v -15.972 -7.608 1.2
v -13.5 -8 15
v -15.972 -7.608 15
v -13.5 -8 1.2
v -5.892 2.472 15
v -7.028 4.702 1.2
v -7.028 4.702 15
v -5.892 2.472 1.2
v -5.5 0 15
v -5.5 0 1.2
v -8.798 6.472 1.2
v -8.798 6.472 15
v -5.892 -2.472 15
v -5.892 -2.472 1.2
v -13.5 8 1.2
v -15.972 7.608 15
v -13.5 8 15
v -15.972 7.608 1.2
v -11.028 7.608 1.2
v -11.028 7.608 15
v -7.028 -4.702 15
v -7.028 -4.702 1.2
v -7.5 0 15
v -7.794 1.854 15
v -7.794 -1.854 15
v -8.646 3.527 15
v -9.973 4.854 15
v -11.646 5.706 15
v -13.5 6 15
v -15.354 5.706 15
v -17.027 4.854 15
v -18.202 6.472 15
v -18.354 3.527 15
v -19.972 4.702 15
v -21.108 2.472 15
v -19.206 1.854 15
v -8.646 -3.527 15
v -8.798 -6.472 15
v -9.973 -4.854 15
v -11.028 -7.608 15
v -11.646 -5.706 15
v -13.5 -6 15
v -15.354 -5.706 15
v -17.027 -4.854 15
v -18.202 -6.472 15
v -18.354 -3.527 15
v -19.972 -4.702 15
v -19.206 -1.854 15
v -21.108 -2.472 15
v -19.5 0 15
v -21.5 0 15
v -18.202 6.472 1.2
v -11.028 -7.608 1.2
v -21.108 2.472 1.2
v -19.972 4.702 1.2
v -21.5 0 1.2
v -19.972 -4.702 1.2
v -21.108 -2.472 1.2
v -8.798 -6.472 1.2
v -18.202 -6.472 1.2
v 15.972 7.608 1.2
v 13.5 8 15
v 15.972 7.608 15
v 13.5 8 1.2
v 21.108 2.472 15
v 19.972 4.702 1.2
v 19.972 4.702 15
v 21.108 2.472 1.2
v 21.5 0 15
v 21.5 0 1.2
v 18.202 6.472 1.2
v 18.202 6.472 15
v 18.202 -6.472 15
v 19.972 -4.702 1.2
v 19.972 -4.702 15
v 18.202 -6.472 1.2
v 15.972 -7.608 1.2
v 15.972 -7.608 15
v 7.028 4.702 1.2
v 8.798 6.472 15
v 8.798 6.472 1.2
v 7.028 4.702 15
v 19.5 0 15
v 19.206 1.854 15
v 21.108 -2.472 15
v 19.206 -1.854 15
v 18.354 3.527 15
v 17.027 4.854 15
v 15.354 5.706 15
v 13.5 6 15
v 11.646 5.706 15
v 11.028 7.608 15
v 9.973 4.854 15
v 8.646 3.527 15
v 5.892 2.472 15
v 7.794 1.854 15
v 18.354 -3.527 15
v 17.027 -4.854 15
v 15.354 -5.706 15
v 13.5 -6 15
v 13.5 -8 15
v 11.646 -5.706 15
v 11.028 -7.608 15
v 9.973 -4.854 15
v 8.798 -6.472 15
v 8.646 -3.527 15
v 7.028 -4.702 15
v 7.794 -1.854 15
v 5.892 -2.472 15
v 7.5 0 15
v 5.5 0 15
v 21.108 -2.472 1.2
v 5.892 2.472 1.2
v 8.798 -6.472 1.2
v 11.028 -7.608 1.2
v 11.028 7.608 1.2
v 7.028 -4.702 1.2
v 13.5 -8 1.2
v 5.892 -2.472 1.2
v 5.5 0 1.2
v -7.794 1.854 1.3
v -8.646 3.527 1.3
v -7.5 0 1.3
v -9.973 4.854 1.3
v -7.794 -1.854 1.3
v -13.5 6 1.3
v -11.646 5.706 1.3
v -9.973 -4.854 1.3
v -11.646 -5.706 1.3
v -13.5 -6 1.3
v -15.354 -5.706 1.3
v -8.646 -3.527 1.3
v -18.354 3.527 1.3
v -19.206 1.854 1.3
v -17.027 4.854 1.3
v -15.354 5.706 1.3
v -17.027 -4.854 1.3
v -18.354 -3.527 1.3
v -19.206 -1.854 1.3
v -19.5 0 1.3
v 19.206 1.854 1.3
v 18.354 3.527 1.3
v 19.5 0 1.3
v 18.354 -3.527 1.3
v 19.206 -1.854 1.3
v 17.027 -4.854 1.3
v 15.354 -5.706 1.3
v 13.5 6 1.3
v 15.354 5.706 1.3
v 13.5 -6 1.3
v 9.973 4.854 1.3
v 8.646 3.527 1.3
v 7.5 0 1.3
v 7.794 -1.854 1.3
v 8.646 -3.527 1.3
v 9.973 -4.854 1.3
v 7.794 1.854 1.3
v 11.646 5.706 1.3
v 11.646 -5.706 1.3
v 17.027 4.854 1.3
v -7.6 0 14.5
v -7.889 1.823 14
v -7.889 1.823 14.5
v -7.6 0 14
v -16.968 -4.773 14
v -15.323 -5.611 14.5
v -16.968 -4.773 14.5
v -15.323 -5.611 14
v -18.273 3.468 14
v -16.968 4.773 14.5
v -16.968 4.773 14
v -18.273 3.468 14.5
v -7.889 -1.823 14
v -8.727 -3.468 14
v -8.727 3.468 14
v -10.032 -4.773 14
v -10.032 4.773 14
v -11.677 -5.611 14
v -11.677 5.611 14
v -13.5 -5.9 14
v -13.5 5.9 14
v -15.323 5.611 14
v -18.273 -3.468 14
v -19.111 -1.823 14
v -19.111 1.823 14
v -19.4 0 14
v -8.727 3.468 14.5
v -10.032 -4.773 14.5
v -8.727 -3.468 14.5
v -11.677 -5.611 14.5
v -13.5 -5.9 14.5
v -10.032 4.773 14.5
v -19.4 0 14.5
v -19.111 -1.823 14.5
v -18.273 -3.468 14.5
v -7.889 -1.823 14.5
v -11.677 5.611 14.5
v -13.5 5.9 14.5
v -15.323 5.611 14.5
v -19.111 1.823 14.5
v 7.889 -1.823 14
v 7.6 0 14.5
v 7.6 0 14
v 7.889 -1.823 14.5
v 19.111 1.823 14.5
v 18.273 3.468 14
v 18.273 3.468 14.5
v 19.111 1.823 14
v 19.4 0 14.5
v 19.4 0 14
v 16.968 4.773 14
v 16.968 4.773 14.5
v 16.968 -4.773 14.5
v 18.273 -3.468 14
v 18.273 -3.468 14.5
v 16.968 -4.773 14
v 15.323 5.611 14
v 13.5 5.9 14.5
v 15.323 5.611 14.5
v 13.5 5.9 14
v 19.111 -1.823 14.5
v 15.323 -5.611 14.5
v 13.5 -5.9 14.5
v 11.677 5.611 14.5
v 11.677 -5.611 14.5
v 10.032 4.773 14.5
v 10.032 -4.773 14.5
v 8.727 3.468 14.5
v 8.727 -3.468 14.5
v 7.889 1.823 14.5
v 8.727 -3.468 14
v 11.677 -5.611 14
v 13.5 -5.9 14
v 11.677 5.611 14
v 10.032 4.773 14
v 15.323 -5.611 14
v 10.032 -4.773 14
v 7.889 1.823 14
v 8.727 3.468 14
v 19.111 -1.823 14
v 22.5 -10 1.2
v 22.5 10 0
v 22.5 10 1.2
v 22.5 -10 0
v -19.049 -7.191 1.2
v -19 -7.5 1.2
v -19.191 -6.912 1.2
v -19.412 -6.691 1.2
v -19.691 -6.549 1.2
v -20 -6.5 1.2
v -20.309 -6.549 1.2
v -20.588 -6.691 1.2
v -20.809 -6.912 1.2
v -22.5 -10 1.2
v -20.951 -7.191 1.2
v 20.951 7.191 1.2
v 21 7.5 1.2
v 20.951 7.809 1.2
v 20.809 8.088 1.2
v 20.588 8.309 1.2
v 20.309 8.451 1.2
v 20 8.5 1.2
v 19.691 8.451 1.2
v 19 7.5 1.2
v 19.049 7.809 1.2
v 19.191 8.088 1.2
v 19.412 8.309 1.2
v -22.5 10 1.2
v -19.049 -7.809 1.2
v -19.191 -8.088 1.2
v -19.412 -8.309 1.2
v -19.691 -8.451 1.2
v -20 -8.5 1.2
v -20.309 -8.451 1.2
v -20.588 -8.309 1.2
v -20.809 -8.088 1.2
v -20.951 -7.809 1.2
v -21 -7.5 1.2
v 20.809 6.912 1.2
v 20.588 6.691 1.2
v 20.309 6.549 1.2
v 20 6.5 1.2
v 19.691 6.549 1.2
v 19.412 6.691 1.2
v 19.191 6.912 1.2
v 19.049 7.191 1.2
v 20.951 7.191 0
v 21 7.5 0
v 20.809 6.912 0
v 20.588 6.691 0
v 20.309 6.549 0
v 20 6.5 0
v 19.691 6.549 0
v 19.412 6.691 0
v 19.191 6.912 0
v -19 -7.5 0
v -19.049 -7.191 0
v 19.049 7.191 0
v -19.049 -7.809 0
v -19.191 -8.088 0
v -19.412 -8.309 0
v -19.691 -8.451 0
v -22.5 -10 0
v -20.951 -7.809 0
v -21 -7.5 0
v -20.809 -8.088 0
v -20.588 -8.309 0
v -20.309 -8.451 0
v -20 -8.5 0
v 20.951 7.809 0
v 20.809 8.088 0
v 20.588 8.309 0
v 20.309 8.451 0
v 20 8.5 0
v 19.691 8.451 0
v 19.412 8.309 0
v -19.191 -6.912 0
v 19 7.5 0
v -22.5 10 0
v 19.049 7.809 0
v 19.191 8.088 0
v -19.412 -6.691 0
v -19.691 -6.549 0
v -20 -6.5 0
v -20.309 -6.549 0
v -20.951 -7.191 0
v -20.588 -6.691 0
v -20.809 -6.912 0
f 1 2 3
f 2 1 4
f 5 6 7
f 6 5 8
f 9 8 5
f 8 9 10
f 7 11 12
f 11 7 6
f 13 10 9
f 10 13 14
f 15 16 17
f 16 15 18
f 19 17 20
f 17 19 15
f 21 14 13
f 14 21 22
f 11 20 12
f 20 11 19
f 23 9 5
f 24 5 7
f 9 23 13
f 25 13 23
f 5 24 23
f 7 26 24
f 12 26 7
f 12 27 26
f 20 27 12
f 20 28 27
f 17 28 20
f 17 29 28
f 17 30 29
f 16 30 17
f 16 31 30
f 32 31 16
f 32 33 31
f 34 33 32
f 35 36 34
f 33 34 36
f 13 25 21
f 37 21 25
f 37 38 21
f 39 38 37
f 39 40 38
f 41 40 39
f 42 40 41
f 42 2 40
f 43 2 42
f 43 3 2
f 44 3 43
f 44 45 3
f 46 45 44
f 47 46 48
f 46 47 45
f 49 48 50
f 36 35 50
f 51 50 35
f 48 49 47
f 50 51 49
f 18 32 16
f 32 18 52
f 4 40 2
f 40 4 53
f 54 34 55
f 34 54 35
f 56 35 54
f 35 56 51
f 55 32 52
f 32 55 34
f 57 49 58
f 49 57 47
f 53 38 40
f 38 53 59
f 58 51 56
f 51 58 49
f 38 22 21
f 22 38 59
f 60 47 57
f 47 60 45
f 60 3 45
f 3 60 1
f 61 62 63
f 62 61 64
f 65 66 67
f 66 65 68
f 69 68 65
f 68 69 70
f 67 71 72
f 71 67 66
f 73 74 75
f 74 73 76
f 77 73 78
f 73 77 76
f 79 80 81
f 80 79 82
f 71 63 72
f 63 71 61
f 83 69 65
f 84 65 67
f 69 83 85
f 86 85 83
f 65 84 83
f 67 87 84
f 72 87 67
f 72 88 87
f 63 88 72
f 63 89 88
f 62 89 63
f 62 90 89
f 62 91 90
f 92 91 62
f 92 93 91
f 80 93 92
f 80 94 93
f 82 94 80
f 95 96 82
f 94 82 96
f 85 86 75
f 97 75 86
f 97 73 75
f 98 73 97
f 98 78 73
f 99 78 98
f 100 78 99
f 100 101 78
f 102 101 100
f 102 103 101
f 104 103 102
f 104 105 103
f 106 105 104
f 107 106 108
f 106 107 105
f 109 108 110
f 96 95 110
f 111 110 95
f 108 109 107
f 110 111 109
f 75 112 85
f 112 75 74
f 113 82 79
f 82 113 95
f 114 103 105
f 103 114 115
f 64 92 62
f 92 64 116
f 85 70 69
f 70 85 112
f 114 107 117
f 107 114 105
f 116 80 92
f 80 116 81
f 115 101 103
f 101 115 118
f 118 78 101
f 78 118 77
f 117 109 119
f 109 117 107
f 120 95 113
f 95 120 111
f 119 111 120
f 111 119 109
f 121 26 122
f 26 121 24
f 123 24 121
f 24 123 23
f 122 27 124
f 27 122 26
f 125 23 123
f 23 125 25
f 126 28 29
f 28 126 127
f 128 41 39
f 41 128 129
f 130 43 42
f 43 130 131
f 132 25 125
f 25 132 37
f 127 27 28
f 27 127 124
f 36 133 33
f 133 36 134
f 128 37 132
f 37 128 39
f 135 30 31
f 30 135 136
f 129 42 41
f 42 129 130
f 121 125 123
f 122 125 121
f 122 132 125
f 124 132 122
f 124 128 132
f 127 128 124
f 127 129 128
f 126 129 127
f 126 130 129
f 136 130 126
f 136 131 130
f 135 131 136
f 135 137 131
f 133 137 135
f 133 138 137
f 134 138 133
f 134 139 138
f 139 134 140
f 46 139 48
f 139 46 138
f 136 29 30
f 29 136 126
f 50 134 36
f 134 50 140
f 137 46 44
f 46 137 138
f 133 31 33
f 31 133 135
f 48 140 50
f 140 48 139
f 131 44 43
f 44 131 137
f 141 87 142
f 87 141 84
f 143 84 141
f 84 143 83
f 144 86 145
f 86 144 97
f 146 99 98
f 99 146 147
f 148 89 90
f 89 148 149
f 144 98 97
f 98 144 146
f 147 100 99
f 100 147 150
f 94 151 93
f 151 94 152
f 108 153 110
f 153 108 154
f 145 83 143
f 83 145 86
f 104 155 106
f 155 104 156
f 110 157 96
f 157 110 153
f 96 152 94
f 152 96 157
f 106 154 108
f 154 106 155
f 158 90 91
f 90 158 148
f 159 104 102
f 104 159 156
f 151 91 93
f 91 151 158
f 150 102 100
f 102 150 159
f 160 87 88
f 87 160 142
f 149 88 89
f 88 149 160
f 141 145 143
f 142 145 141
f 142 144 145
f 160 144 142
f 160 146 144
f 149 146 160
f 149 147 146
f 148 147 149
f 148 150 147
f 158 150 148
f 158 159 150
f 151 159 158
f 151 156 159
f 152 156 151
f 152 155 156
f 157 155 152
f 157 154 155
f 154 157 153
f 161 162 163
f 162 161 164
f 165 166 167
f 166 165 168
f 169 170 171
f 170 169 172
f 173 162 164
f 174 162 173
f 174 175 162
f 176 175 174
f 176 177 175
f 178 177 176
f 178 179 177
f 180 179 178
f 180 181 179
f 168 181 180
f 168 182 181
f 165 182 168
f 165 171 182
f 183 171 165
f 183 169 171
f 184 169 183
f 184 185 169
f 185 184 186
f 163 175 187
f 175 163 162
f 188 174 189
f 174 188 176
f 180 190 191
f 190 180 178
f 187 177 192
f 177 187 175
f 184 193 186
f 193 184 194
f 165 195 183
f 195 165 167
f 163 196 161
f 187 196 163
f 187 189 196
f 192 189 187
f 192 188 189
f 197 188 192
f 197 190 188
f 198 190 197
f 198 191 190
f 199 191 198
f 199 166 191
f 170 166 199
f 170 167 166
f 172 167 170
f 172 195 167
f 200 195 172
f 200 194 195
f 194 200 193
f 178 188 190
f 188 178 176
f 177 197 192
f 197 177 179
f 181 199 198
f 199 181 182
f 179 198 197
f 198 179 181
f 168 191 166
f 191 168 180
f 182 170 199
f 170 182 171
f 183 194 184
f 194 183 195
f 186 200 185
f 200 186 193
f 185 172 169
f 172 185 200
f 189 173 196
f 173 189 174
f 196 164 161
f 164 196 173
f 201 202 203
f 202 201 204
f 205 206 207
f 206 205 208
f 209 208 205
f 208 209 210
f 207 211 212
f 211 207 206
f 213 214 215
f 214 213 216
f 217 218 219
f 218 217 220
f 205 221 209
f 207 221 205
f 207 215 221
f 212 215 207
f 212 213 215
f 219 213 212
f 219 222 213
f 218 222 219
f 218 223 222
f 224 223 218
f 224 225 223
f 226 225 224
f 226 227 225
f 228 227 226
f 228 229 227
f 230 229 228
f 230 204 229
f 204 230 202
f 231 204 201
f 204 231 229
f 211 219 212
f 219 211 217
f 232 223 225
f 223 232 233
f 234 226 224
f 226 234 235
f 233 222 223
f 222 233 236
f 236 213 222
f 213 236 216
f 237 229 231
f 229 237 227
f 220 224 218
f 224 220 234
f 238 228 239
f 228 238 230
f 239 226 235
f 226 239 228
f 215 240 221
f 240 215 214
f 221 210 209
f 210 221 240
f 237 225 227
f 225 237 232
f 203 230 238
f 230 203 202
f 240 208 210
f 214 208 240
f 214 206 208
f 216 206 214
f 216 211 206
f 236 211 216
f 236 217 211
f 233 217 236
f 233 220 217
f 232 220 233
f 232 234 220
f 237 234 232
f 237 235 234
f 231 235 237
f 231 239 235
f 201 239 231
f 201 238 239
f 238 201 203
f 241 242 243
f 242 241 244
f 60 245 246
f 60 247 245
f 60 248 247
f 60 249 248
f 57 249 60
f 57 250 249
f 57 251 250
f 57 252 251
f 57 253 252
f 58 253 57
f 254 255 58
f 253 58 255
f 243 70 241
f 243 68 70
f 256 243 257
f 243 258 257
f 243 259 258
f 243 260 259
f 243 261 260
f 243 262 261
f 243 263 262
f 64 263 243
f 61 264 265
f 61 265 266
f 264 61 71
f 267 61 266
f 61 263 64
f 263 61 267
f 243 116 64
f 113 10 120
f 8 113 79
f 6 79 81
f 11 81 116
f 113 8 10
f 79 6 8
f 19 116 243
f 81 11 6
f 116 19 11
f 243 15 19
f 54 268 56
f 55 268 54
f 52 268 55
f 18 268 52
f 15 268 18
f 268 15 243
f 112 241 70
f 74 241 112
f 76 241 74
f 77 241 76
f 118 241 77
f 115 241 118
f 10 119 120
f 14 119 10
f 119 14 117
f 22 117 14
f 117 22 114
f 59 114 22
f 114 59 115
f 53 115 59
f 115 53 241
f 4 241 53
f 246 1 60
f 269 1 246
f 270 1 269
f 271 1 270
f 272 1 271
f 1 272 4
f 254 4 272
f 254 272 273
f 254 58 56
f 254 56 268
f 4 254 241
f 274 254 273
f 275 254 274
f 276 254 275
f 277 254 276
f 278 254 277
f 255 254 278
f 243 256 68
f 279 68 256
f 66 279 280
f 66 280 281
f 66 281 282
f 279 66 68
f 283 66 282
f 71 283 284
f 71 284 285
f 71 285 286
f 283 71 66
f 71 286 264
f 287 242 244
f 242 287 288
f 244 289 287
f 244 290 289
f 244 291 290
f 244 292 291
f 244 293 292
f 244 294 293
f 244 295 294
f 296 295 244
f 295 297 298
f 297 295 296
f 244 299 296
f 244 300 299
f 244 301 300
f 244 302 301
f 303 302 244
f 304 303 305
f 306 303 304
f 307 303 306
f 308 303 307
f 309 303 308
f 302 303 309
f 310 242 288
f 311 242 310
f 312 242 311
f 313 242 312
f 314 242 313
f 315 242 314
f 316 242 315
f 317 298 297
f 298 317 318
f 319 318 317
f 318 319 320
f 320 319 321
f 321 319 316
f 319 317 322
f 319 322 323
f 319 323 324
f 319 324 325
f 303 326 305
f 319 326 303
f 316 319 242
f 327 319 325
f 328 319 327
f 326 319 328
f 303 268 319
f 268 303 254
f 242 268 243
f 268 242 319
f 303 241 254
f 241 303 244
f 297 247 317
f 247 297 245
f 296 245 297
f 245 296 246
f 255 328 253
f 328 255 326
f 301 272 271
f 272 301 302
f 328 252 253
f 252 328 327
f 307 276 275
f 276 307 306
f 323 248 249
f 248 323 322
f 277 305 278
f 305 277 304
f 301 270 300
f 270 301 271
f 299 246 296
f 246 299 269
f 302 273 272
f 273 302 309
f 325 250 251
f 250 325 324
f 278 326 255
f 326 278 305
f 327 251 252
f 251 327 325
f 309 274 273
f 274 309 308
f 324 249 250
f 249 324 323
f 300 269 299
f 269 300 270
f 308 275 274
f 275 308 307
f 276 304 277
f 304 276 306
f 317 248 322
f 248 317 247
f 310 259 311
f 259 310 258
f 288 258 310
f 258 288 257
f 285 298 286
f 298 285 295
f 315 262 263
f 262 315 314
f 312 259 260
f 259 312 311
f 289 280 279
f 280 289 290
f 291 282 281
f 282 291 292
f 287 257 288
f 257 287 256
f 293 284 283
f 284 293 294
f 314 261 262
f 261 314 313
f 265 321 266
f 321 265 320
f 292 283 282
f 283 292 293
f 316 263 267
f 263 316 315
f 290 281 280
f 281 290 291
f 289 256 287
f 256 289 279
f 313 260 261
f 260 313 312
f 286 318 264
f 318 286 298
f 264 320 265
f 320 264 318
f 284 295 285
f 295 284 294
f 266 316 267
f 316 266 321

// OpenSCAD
// file: config.scad
//// Ultrasonic Module
// CONFIG

// Colors

pcb_color="Blue";	// PCB color
pcb_tr=1;		// PCB transparency (0 to 1)
pr_color="Silver";	// Probe color
pr_tr=1;		// Probe transparency (0 to 1)
pr_n_color="Black";	// Probe net color
pr_n_tr=0.3;		// Probe net transparency (0 to 1)


// Variables

$fn=20;			// Resolution (faces per side on cylinders, cones, ...)
g_hei=15;		// Global height
pcb_len=45;		// PCB length
pcb_wid=20;		// PCB width
pcb_th=1.2;		// PCB thickness
pr_dia=16;		// Probe diameter
pr_th=2;		// Probe border thickness
pr_n_th=0.5;		// Probe net thickness
pr_n_g=0.5;		// Probe net gap depth
pr_spa=27;		// Space between the probes (center)
s_h_dia=2;		// Screw holes diameter
s_h_dep=10;		// Screw holes depth
s_x_spa=40;		// Screw spacing in X (center)
s_y_spa=15;		// Screw spacing in Y (center)


// Computed variables /!\ DON'T TOUCH THESE ONES /!\

pad=0.1;			// Padding for geometrical manifoldness
pr_rad=(pr_dia / 2);		// Probe radius
s_h_rad=(s_h_dia / 2);		// Screw holes radius
// main file
//// Ultrasonic Module
// DESIGN

// Import external files

include <./config.scad>;		// Configuration file


// Module design

module sonicModule(sl, s_dep=s_h_dep,shape=true) {
	if(shape) {					// Add material
		difference() {
			union() {
				color(pcb_color, pcb_tr=1) {
					translate([-(pcb_len / 2), -(pcb_wid / 2), 0]) cube([pcb_len, pcb_wid, pcb_th]);
				}

				color(pr_color, pr_tr) {
					difference() {
						union() {
							translate([-(pr_spa / 2), 0, pad]) cylinder(r = pr_rad, h = (g_hei - pad));
							translate([(pr_spa / 2), 0, pad]) cylinder(r = pr_rad, h = (g_hei - pad));
						}

						union() {
							translate([-(pr_spa / 2), 0, (pcb_th + pad)]) cylinder(r = (pr_rad - pr_th), h = (g_hei + pad - pcb_th));
							translate([(pr_spa / 2), 0, (pcb_th + pad)]) cylinder(r = (pr_rad - pr_th), h = (g_hei + pad - pcb_th));
						}
					}
				}

				color(pr_n_color, pr_n_tr) {
					union() {
						translate([-(pr_spa / 2), 0, (g_hei - (pr_n_th + pr_n_g))]) cylinder(r = (pr_rad - pr_th - pad), h = pr_n_th);
						translate([(pr_spa / 2), 0, (g_hei - (pr_n_th + pr_n_g))]) cylinder(r = (pr_rad - pr_th - pad), h = pr_n_th);
					}
				}
			}

			union() {
				translate([-(s_x_spa / 2), -(s_y_spa / 2), -pad]) cylinder(r = s_h_rad, h = (pcb_th + (pad * 2)));
				translate([(s_x_spa / 2), (s_y_spa / 2), -pad]) cylinder(r = s_h_rad, h = (pcb_th + (pad * 2)));
			}
		}
	}

	else {						// Subtract material
		translate([-((pcb_len + sl) / 2), -((pcb_wid + sl) / 2), -pad]) cube([(pcb_len + sl), (pcb_wid + sl), (pcb_th + (pad * 2))]);
		translate([-(pr_spa / 2), 0, pad]) cylinder(r = pr_rad + sl, h = (g_hei - pad + sl));
		translate([(pr_spa / 2), 0, pad]) cylinder(r = pr_rad + sl, h = (g_hei - pad + sl));
		translate([-(s_x_spa / 2), -(s_y_spa / 2), -pad]) cylinder(r = s_h_rad, h = s_dep);
		translate([(s_x_spa / 2), (s_y_spa / 2), -pad]) cylinder(r = s_h_rad, h = s_dep);
	}
}


// DEBUG


sonicModule();
